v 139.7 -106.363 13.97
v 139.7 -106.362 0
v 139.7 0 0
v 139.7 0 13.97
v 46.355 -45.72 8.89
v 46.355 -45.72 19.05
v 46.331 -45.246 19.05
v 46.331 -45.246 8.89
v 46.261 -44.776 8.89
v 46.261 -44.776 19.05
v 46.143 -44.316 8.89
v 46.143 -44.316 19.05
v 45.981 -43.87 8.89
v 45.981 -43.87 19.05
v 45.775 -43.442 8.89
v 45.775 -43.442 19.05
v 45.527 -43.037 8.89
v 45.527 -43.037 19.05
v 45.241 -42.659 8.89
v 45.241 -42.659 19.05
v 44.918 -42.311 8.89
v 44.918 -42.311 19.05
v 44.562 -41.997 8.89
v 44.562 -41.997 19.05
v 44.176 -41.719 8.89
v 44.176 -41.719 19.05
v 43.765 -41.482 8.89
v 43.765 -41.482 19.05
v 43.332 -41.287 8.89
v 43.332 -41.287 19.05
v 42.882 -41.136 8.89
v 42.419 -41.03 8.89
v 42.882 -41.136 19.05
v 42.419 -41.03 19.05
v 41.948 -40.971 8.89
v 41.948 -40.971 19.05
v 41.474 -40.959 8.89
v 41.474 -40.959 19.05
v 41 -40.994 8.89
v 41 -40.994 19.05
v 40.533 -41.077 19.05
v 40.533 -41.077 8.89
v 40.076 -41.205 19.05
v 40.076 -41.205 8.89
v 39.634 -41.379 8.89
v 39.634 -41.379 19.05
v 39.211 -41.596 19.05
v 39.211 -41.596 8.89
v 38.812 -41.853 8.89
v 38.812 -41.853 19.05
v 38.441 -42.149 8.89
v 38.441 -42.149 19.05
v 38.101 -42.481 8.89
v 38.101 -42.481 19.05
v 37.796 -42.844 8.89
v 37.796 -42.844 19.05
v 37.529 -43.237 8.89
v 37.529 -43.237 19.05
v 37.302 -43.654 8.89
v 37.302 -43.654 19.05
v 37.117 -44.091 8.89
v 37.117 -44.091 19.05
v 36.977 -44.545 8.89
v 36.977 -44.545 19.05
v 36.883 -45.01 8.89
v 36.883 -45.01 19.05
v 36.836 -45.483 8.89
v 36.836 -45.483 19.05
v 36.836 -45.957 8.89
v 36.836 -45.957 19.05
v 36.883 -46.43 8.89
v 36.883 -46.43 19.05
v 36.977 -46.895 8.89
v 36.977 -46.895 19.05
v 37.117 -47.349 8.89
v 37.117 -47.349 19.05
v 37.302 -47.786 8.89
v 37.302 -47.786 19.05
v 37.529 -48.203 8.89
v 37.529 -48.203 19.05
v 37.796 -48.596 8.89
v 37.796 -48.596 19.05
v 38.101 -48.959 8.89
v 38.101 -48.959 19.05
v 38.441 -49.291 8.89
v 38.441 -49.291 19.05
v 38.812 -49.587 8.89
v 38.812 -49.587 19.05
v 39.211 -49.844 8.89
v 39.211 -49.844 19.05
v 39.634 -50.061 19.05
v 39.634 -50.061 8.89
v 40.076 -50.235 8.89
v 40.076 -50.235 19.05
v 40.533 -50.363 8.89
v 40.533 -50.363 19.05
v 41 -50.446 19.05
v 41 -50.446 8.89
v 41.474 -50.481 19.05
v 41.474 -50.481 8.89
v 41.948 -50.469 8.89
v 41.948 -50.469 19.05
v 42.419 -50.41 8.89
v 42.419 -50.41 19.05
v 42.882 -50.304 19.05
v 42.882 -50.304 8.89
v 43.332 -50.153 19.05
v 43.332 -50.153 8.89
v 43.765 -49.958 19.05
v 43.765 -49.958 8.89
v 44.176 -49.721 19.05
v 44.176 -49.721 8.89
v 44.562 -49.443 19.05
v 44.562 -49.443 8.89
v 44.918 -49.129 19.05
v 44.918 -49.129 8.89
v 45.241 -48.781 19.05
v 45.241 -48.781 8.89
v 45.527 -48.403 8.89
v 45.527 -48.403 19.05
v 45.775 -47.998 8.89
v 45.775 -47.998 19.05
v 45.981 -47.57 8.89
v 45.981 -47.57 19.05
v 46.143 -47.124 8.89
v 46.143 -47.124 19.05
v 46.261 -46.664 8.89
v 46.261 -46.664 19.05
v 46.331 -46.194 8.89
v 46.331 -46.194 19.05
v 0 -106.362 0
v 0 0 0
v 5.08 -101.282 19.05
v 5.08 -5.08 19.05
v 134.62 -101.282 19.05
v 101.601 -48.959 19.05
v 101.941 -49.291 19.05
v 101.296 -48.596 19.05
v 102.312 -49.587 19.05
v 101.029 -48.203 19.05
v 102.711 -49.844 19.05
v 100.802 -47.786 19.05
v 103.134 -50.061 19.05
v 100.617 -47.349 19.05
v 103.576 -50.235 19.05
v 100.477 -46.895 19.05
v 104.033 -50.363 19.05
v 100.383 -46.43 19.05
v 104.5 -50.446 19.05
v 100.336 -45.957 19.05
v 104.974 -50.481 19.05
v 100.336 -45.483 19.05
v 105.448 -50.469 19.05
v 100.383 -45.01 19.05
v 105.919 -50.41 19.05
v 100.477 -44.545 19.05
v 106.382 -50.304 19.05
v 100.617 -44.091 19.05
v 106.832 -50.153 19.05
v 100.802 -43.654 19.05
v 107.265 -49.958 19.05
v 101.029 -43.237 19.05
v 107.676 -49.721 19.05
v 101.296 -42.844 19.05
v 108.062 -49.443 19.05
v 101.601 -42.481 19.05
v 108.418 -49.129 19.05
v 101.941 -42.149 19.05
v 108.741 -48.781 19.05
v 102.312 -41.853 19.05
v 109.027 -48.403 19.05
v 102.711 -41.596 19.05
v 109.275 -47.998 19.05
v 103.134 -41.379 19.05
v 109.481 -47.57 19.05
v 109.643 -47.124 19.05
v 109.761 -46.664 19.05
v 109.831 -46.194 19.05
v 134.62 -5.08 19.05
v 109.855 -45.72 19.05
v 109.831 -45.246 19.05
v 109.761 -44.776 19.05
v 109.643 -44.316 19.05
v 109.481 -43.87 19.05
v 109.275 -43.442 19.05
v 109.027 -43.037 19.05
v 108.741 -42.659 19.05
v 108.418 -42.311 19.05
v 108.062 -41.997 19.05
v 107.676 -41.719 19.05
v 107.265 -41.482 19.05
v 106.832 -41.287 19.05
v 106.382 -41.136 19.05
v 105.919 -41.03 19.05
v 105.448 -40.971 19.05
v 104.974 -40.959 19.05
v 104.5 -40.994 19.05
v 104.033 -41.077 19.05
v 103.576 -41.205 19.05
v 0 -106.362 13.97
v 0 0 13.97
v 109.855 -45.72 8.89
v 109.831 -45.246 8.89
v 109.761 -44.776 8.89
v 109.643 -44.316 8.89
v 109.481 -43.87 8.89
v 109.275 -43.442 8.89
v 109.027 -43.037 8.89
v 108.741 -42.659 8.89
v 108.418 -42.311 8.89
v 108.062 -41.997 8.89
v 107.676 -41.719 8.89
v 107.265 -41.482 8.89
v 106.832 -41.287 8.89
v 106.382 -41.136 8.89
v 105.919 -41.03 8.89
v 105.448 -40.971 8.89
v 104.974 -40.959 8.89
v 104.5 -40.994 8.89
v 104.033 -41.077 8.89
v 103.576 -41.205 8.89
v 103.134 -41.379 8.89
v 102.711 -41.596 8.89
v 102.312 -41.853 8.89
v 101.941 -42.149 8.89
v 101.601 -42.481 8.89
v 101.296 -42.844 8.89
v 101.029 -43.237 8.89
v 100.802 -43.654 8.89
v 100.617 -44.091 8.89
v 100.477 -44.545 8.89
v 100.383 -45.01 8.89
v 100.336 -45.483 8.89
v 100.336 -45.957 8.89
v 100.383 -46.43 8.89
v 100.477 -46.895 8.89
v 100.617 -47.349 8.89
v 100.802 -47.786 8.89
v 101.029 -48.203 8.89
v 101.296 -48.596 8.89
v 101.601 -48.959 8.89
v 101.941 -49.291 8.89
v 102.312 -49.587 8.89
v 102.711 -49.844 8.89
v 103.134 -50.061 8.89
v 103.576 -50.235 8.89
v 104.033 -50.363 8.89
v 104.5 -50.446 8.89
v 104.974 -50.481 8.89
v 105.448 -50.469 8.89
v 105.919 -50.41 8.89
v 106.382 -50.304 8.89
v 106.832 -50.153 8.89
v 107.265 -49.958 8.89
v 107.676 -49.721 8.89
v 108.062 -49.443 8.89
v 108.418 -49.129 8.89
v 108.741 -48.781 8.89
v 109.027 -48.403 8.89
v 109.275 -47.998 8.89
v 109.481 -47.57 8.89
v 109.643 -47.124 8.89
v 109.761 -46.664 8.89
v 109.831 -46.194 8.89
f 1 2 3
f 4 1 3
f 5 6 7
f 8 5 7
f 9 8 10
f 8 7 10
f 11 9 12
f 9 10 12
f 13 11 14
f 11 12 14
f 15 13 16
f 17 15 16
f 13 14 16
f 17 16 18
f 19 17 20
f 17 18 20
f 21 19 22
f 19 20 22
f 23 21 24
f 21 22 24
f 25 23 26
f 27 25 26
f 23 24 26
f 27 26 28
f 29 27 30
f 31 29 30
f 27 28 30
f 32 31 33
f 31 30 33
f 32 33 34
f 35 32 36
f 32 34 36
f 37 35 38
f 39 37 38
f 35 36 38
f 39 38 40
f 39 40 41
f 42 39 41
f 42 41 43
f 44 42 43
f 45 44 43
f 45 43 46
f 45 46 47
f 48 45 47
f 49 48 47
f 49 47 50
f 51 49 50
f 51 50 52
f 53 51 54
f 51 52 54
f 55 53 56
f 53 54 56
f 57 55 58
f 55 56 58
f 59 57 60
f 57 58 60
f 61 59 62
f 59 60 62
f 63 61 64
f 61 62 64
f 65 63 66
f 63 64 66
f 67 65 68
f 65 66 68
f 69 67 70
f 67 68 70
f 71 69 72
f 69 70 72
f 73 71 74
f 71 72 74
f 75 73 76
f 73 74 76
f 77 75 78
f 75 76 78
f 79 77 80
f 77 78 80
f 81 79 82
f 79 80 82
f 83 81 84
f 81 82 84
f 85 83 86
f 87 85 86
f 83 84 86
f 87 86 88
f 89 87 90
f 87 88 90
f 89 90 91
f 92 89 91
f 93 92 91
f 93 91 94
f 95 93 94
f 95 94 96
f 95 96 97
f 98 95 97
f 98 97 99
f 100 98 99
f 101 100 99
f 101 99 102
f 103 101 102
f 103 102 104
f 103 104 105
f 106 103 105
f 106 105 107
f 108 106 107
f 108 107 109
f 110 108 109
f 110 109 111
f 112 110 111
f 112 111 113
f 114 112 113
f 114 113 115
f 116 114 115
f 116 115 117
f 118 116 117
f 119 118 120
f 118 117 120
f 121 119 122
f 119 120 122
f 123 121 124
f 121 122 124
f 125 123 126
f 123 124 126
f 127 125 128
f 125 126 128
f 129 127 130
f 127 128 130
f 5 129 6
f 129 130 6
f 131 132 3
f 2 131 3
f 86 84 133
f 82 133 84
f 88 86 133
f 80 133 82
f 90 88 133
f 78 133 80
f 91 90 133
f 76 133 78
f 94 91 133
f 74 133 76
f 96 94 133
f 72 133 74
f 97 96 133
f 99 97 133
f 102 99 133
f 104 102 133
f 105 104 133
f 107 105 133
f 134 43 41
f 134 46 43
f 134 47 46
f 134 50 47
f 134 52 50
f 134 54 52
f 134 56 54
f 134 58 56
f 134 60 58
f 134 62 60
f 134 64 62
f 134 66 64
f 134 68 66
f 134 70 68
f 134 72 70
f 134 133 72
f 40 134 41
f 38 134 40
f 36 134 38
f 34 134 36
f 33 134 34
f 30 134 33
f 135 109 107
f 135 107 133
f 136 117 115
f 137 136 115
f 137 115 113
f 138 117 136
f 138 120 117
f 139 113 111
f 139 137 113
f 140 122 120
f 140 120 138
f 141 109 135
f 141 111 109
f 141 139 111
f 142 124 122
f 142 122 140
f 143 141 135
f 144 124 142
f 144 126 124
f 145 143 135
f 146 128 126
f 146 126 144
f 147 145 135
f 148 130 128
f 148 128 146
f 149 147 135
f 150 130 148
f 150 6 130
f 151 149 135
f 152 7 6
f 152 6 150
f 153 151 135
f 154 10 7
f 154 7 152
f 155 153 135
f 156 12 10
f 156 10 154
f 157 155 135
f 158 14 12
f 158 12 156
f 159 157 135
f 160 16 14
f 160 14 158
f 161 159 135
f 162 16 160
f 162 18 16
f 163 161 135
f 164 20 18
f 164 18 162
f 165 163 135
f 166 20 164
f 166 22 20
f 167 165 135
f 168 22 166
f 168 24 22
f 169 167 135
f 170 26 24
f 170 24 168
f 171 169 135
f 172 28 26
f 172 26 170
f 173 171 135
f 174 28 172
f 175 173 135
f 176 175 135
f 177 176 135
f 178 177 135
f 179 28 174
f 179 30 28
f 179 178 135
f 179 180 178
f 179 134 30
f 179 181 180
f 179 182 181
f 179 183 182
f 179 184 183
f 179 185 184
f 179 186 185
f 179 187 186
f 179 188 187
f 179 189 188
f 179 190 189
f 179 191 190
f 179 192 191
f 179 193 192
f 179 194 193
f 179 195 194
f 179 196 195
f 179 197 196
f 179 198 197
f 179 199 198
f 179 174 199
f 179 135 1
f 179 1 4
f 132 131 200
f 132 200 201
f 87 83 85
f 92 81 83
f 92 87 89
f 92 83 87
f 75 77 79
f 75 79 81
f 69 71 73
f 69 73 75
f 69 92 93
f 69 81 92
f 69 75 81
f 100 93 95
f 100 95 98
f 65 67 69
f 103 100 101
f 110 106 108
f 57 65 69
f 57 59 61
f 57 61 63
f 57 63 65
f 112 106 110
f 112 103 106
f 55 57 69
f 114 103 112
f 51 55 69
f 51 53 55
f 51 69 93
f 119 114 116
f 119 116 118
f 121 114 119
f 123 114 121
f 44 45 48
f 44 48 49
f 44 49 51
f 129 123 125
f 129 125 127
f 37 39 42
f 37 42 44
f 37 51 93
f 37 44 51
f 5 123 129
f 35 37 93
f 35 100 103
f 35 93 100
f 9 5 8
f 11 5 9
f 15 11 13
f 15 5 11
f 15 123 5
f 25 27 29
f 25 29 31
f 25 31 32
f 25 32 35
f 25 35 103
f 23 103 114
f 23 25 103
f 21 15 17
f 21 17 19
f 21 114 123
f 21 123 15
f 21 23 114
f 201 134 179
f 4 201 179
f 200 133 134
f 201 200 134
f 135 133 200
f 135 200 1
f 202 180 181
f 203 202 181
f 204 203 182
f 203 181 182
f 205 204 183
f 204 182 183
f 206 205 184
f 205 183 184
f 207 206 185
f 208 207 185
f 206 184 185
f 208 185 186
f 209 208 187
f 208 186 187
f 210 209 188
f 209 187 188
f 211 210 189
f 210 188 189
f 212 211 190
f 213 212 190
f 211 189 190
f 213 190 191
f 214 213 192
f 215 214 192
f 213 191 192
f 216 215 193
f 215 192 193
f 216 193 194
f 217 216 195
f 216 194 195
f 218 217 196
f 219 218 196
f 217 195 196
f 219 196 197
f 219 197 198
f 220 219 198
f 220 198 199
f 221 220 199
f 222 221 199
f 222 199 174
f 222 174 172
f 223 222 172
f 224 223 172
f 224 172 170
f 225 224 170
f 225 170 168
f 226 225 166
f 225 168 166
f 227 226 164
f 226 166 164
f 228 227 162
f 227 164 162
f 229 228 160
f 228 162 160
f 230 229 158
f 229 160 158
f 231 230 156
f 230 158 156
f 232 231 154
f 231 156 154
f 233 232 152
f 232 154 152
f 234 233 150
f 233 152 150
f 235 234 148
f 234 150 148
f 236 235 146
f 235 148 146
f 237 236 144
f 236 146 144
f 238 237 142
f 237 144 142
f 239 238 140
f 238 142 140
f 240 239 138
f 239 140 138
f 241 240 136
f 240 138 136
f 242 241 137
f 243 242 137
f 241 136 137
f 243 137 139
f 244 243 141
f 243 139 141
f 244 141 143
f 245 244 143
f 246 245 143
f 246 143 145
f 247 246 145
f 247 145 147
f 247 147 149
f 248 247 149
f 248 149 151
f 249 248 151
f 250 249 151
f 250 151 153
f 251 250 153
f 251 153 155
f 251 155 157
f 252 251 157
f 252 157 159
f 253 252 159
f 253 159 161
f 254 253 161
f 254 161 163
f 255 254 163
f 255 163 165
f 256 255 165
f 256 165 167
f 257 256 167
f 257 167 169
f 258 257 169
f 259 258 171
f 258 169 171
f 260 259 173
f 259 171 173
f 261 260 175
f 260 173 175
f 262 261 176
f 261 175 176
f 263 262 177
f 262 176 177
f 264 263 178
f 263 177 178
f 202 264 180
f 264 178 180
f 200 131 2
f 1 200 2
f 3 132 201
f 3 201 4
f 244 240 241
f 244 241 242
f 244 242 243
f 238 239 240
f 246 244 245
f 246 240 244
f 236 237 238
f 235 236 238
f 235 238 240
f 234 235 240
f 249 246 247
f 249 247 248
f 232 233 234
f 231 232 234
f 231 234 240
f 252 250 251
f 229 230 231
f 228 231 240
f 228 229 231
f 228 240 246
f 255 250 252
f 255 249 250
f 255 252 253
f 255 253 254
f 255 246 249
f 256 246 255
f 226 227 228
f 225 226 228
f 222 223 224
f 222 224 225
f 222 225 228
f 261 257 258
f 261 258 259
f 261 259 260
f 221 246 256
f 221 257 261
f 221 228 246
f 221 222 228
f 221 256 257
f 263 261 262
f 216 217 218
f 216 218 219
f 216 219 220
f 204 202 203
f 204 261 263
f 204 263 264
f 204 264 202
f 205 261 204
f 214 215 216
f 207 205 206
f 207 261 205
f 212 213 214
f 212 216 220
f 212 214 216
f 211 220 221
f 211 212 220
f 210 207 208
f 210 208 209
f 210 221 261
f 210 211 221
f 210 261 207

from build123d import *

# Parameters (mm, degrees)
F0_W     = 139.7
F0_H     = 106.3625
F1_DEPTH = 19.05
F2_SIZE  = 5.08
F3_R     = 4.7625
F4_DEPTH = 10.16


with BuildPart() as f1:
    # F0 (on Top) → F1 (new body)
    with BuildSketch(Plane.XY):
        with Locations((69.85, -53.18125)):
            Rectangle(F0_W, F0_H)
    extrude(amount=F1_DEPTH)

    # F2
    f2_edges = [f1.edges().sort_by_distance(p)[0] for p in [
        (69.85, 0, 19.05),
        (0, -53.18125, 19.05),
        (69.85, -106.3625, 19.05),
        (139.7, -53.18125, 19.05),
    ]]
    chamfer(f2_edges, length=F2_SIZE)

    # F3 (on face) → F4 (cut)
    with BuildSketch(Plane.XY.offset(19.05)):
        with Locations((41.5925, -45.72)):
            Circle(F3_R)
        with Locations((105.0925, -45.72)):
            Circle(F3_R)
    extrude(amount=-F4_DEPTH, mode=Mode.SUBTRACT)


solid = f1.part
